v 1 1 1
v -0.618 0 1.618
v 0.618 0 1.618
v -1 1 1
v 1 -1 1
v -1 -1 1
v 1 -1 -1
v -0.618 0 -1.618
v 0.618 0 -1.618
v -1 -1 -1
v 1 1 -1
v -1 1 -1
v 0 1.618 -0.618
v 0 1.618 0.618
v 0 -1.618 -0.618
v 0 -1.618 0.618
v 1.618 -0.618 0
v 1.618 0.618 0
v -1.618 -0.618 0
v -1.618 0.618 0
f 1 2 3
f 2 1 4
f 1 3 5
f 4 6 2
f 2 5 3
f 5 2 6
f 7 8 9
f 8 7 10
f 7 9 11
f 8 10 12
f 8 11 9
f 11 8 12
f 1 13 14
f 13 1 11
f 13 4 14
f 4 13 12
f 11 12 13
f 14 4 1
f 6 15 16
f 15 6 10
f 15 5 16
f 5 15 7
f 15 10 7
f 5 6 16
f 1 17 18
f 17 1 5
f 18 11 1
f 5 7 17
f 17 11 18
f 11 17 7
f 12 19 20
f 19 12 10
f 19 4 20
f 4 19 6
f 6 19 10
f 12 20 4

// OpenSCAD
rpenta = 1/sin(72);

// rpenta * 1/2*sqrt(2)*sqrt(-sqrt(5) + 5)
cpenta = rpenta * sqrt(pow(sin(72), 2) + pow(1-cos(72), 2));

// z^2 + (1-cpenta/2)^2 + 1 = cpenta^2
// zc = sqrt(pow(cpenta, 2) - (pow(1-cpenta/2, 2) + 1));
zc = cpenta/2;

module dodecaprism() {
     polyhedron ( points = [
		       [ 1, 1, 0],
		       [ 1,-1, 0],
		       [-1, 1, 0],
		       [-1,-1, 0],
		       [ cpenta/2,0,zc],
		       [-cpenta/2,0,zc]
		       ],
                 faces = [[0,2,1],
                          [1,2,3],
                          [0,1,4],
			  [0,4,2],
			  [2,4,5],
			  [1,3,4],
			  [3,5,4],
			  [2,5,3]
		      ]
             );

};

module dodecahedron(scl) {
  scale(scl) {
    cube(2, center=true);
    translate([0,0,1]) dodecaprism();
    translate([0,0,-1]) rotate([180,0,0]) dodecaprism();
    rotate([-90,90,0]) translate([0,0,1]) dodecaprism();
    rotate([-90,90,180]) translate([0,0,1]) dodecaprism();
    rotate([90,0,0]) rotate([0,90,0]) translate([0,0,1]) dodecaprism();
    rotate([90,0,180]) rotate([0,90,0]) translate([0,0,1]) dodecaprism();
  }
};

dodecahedron();
